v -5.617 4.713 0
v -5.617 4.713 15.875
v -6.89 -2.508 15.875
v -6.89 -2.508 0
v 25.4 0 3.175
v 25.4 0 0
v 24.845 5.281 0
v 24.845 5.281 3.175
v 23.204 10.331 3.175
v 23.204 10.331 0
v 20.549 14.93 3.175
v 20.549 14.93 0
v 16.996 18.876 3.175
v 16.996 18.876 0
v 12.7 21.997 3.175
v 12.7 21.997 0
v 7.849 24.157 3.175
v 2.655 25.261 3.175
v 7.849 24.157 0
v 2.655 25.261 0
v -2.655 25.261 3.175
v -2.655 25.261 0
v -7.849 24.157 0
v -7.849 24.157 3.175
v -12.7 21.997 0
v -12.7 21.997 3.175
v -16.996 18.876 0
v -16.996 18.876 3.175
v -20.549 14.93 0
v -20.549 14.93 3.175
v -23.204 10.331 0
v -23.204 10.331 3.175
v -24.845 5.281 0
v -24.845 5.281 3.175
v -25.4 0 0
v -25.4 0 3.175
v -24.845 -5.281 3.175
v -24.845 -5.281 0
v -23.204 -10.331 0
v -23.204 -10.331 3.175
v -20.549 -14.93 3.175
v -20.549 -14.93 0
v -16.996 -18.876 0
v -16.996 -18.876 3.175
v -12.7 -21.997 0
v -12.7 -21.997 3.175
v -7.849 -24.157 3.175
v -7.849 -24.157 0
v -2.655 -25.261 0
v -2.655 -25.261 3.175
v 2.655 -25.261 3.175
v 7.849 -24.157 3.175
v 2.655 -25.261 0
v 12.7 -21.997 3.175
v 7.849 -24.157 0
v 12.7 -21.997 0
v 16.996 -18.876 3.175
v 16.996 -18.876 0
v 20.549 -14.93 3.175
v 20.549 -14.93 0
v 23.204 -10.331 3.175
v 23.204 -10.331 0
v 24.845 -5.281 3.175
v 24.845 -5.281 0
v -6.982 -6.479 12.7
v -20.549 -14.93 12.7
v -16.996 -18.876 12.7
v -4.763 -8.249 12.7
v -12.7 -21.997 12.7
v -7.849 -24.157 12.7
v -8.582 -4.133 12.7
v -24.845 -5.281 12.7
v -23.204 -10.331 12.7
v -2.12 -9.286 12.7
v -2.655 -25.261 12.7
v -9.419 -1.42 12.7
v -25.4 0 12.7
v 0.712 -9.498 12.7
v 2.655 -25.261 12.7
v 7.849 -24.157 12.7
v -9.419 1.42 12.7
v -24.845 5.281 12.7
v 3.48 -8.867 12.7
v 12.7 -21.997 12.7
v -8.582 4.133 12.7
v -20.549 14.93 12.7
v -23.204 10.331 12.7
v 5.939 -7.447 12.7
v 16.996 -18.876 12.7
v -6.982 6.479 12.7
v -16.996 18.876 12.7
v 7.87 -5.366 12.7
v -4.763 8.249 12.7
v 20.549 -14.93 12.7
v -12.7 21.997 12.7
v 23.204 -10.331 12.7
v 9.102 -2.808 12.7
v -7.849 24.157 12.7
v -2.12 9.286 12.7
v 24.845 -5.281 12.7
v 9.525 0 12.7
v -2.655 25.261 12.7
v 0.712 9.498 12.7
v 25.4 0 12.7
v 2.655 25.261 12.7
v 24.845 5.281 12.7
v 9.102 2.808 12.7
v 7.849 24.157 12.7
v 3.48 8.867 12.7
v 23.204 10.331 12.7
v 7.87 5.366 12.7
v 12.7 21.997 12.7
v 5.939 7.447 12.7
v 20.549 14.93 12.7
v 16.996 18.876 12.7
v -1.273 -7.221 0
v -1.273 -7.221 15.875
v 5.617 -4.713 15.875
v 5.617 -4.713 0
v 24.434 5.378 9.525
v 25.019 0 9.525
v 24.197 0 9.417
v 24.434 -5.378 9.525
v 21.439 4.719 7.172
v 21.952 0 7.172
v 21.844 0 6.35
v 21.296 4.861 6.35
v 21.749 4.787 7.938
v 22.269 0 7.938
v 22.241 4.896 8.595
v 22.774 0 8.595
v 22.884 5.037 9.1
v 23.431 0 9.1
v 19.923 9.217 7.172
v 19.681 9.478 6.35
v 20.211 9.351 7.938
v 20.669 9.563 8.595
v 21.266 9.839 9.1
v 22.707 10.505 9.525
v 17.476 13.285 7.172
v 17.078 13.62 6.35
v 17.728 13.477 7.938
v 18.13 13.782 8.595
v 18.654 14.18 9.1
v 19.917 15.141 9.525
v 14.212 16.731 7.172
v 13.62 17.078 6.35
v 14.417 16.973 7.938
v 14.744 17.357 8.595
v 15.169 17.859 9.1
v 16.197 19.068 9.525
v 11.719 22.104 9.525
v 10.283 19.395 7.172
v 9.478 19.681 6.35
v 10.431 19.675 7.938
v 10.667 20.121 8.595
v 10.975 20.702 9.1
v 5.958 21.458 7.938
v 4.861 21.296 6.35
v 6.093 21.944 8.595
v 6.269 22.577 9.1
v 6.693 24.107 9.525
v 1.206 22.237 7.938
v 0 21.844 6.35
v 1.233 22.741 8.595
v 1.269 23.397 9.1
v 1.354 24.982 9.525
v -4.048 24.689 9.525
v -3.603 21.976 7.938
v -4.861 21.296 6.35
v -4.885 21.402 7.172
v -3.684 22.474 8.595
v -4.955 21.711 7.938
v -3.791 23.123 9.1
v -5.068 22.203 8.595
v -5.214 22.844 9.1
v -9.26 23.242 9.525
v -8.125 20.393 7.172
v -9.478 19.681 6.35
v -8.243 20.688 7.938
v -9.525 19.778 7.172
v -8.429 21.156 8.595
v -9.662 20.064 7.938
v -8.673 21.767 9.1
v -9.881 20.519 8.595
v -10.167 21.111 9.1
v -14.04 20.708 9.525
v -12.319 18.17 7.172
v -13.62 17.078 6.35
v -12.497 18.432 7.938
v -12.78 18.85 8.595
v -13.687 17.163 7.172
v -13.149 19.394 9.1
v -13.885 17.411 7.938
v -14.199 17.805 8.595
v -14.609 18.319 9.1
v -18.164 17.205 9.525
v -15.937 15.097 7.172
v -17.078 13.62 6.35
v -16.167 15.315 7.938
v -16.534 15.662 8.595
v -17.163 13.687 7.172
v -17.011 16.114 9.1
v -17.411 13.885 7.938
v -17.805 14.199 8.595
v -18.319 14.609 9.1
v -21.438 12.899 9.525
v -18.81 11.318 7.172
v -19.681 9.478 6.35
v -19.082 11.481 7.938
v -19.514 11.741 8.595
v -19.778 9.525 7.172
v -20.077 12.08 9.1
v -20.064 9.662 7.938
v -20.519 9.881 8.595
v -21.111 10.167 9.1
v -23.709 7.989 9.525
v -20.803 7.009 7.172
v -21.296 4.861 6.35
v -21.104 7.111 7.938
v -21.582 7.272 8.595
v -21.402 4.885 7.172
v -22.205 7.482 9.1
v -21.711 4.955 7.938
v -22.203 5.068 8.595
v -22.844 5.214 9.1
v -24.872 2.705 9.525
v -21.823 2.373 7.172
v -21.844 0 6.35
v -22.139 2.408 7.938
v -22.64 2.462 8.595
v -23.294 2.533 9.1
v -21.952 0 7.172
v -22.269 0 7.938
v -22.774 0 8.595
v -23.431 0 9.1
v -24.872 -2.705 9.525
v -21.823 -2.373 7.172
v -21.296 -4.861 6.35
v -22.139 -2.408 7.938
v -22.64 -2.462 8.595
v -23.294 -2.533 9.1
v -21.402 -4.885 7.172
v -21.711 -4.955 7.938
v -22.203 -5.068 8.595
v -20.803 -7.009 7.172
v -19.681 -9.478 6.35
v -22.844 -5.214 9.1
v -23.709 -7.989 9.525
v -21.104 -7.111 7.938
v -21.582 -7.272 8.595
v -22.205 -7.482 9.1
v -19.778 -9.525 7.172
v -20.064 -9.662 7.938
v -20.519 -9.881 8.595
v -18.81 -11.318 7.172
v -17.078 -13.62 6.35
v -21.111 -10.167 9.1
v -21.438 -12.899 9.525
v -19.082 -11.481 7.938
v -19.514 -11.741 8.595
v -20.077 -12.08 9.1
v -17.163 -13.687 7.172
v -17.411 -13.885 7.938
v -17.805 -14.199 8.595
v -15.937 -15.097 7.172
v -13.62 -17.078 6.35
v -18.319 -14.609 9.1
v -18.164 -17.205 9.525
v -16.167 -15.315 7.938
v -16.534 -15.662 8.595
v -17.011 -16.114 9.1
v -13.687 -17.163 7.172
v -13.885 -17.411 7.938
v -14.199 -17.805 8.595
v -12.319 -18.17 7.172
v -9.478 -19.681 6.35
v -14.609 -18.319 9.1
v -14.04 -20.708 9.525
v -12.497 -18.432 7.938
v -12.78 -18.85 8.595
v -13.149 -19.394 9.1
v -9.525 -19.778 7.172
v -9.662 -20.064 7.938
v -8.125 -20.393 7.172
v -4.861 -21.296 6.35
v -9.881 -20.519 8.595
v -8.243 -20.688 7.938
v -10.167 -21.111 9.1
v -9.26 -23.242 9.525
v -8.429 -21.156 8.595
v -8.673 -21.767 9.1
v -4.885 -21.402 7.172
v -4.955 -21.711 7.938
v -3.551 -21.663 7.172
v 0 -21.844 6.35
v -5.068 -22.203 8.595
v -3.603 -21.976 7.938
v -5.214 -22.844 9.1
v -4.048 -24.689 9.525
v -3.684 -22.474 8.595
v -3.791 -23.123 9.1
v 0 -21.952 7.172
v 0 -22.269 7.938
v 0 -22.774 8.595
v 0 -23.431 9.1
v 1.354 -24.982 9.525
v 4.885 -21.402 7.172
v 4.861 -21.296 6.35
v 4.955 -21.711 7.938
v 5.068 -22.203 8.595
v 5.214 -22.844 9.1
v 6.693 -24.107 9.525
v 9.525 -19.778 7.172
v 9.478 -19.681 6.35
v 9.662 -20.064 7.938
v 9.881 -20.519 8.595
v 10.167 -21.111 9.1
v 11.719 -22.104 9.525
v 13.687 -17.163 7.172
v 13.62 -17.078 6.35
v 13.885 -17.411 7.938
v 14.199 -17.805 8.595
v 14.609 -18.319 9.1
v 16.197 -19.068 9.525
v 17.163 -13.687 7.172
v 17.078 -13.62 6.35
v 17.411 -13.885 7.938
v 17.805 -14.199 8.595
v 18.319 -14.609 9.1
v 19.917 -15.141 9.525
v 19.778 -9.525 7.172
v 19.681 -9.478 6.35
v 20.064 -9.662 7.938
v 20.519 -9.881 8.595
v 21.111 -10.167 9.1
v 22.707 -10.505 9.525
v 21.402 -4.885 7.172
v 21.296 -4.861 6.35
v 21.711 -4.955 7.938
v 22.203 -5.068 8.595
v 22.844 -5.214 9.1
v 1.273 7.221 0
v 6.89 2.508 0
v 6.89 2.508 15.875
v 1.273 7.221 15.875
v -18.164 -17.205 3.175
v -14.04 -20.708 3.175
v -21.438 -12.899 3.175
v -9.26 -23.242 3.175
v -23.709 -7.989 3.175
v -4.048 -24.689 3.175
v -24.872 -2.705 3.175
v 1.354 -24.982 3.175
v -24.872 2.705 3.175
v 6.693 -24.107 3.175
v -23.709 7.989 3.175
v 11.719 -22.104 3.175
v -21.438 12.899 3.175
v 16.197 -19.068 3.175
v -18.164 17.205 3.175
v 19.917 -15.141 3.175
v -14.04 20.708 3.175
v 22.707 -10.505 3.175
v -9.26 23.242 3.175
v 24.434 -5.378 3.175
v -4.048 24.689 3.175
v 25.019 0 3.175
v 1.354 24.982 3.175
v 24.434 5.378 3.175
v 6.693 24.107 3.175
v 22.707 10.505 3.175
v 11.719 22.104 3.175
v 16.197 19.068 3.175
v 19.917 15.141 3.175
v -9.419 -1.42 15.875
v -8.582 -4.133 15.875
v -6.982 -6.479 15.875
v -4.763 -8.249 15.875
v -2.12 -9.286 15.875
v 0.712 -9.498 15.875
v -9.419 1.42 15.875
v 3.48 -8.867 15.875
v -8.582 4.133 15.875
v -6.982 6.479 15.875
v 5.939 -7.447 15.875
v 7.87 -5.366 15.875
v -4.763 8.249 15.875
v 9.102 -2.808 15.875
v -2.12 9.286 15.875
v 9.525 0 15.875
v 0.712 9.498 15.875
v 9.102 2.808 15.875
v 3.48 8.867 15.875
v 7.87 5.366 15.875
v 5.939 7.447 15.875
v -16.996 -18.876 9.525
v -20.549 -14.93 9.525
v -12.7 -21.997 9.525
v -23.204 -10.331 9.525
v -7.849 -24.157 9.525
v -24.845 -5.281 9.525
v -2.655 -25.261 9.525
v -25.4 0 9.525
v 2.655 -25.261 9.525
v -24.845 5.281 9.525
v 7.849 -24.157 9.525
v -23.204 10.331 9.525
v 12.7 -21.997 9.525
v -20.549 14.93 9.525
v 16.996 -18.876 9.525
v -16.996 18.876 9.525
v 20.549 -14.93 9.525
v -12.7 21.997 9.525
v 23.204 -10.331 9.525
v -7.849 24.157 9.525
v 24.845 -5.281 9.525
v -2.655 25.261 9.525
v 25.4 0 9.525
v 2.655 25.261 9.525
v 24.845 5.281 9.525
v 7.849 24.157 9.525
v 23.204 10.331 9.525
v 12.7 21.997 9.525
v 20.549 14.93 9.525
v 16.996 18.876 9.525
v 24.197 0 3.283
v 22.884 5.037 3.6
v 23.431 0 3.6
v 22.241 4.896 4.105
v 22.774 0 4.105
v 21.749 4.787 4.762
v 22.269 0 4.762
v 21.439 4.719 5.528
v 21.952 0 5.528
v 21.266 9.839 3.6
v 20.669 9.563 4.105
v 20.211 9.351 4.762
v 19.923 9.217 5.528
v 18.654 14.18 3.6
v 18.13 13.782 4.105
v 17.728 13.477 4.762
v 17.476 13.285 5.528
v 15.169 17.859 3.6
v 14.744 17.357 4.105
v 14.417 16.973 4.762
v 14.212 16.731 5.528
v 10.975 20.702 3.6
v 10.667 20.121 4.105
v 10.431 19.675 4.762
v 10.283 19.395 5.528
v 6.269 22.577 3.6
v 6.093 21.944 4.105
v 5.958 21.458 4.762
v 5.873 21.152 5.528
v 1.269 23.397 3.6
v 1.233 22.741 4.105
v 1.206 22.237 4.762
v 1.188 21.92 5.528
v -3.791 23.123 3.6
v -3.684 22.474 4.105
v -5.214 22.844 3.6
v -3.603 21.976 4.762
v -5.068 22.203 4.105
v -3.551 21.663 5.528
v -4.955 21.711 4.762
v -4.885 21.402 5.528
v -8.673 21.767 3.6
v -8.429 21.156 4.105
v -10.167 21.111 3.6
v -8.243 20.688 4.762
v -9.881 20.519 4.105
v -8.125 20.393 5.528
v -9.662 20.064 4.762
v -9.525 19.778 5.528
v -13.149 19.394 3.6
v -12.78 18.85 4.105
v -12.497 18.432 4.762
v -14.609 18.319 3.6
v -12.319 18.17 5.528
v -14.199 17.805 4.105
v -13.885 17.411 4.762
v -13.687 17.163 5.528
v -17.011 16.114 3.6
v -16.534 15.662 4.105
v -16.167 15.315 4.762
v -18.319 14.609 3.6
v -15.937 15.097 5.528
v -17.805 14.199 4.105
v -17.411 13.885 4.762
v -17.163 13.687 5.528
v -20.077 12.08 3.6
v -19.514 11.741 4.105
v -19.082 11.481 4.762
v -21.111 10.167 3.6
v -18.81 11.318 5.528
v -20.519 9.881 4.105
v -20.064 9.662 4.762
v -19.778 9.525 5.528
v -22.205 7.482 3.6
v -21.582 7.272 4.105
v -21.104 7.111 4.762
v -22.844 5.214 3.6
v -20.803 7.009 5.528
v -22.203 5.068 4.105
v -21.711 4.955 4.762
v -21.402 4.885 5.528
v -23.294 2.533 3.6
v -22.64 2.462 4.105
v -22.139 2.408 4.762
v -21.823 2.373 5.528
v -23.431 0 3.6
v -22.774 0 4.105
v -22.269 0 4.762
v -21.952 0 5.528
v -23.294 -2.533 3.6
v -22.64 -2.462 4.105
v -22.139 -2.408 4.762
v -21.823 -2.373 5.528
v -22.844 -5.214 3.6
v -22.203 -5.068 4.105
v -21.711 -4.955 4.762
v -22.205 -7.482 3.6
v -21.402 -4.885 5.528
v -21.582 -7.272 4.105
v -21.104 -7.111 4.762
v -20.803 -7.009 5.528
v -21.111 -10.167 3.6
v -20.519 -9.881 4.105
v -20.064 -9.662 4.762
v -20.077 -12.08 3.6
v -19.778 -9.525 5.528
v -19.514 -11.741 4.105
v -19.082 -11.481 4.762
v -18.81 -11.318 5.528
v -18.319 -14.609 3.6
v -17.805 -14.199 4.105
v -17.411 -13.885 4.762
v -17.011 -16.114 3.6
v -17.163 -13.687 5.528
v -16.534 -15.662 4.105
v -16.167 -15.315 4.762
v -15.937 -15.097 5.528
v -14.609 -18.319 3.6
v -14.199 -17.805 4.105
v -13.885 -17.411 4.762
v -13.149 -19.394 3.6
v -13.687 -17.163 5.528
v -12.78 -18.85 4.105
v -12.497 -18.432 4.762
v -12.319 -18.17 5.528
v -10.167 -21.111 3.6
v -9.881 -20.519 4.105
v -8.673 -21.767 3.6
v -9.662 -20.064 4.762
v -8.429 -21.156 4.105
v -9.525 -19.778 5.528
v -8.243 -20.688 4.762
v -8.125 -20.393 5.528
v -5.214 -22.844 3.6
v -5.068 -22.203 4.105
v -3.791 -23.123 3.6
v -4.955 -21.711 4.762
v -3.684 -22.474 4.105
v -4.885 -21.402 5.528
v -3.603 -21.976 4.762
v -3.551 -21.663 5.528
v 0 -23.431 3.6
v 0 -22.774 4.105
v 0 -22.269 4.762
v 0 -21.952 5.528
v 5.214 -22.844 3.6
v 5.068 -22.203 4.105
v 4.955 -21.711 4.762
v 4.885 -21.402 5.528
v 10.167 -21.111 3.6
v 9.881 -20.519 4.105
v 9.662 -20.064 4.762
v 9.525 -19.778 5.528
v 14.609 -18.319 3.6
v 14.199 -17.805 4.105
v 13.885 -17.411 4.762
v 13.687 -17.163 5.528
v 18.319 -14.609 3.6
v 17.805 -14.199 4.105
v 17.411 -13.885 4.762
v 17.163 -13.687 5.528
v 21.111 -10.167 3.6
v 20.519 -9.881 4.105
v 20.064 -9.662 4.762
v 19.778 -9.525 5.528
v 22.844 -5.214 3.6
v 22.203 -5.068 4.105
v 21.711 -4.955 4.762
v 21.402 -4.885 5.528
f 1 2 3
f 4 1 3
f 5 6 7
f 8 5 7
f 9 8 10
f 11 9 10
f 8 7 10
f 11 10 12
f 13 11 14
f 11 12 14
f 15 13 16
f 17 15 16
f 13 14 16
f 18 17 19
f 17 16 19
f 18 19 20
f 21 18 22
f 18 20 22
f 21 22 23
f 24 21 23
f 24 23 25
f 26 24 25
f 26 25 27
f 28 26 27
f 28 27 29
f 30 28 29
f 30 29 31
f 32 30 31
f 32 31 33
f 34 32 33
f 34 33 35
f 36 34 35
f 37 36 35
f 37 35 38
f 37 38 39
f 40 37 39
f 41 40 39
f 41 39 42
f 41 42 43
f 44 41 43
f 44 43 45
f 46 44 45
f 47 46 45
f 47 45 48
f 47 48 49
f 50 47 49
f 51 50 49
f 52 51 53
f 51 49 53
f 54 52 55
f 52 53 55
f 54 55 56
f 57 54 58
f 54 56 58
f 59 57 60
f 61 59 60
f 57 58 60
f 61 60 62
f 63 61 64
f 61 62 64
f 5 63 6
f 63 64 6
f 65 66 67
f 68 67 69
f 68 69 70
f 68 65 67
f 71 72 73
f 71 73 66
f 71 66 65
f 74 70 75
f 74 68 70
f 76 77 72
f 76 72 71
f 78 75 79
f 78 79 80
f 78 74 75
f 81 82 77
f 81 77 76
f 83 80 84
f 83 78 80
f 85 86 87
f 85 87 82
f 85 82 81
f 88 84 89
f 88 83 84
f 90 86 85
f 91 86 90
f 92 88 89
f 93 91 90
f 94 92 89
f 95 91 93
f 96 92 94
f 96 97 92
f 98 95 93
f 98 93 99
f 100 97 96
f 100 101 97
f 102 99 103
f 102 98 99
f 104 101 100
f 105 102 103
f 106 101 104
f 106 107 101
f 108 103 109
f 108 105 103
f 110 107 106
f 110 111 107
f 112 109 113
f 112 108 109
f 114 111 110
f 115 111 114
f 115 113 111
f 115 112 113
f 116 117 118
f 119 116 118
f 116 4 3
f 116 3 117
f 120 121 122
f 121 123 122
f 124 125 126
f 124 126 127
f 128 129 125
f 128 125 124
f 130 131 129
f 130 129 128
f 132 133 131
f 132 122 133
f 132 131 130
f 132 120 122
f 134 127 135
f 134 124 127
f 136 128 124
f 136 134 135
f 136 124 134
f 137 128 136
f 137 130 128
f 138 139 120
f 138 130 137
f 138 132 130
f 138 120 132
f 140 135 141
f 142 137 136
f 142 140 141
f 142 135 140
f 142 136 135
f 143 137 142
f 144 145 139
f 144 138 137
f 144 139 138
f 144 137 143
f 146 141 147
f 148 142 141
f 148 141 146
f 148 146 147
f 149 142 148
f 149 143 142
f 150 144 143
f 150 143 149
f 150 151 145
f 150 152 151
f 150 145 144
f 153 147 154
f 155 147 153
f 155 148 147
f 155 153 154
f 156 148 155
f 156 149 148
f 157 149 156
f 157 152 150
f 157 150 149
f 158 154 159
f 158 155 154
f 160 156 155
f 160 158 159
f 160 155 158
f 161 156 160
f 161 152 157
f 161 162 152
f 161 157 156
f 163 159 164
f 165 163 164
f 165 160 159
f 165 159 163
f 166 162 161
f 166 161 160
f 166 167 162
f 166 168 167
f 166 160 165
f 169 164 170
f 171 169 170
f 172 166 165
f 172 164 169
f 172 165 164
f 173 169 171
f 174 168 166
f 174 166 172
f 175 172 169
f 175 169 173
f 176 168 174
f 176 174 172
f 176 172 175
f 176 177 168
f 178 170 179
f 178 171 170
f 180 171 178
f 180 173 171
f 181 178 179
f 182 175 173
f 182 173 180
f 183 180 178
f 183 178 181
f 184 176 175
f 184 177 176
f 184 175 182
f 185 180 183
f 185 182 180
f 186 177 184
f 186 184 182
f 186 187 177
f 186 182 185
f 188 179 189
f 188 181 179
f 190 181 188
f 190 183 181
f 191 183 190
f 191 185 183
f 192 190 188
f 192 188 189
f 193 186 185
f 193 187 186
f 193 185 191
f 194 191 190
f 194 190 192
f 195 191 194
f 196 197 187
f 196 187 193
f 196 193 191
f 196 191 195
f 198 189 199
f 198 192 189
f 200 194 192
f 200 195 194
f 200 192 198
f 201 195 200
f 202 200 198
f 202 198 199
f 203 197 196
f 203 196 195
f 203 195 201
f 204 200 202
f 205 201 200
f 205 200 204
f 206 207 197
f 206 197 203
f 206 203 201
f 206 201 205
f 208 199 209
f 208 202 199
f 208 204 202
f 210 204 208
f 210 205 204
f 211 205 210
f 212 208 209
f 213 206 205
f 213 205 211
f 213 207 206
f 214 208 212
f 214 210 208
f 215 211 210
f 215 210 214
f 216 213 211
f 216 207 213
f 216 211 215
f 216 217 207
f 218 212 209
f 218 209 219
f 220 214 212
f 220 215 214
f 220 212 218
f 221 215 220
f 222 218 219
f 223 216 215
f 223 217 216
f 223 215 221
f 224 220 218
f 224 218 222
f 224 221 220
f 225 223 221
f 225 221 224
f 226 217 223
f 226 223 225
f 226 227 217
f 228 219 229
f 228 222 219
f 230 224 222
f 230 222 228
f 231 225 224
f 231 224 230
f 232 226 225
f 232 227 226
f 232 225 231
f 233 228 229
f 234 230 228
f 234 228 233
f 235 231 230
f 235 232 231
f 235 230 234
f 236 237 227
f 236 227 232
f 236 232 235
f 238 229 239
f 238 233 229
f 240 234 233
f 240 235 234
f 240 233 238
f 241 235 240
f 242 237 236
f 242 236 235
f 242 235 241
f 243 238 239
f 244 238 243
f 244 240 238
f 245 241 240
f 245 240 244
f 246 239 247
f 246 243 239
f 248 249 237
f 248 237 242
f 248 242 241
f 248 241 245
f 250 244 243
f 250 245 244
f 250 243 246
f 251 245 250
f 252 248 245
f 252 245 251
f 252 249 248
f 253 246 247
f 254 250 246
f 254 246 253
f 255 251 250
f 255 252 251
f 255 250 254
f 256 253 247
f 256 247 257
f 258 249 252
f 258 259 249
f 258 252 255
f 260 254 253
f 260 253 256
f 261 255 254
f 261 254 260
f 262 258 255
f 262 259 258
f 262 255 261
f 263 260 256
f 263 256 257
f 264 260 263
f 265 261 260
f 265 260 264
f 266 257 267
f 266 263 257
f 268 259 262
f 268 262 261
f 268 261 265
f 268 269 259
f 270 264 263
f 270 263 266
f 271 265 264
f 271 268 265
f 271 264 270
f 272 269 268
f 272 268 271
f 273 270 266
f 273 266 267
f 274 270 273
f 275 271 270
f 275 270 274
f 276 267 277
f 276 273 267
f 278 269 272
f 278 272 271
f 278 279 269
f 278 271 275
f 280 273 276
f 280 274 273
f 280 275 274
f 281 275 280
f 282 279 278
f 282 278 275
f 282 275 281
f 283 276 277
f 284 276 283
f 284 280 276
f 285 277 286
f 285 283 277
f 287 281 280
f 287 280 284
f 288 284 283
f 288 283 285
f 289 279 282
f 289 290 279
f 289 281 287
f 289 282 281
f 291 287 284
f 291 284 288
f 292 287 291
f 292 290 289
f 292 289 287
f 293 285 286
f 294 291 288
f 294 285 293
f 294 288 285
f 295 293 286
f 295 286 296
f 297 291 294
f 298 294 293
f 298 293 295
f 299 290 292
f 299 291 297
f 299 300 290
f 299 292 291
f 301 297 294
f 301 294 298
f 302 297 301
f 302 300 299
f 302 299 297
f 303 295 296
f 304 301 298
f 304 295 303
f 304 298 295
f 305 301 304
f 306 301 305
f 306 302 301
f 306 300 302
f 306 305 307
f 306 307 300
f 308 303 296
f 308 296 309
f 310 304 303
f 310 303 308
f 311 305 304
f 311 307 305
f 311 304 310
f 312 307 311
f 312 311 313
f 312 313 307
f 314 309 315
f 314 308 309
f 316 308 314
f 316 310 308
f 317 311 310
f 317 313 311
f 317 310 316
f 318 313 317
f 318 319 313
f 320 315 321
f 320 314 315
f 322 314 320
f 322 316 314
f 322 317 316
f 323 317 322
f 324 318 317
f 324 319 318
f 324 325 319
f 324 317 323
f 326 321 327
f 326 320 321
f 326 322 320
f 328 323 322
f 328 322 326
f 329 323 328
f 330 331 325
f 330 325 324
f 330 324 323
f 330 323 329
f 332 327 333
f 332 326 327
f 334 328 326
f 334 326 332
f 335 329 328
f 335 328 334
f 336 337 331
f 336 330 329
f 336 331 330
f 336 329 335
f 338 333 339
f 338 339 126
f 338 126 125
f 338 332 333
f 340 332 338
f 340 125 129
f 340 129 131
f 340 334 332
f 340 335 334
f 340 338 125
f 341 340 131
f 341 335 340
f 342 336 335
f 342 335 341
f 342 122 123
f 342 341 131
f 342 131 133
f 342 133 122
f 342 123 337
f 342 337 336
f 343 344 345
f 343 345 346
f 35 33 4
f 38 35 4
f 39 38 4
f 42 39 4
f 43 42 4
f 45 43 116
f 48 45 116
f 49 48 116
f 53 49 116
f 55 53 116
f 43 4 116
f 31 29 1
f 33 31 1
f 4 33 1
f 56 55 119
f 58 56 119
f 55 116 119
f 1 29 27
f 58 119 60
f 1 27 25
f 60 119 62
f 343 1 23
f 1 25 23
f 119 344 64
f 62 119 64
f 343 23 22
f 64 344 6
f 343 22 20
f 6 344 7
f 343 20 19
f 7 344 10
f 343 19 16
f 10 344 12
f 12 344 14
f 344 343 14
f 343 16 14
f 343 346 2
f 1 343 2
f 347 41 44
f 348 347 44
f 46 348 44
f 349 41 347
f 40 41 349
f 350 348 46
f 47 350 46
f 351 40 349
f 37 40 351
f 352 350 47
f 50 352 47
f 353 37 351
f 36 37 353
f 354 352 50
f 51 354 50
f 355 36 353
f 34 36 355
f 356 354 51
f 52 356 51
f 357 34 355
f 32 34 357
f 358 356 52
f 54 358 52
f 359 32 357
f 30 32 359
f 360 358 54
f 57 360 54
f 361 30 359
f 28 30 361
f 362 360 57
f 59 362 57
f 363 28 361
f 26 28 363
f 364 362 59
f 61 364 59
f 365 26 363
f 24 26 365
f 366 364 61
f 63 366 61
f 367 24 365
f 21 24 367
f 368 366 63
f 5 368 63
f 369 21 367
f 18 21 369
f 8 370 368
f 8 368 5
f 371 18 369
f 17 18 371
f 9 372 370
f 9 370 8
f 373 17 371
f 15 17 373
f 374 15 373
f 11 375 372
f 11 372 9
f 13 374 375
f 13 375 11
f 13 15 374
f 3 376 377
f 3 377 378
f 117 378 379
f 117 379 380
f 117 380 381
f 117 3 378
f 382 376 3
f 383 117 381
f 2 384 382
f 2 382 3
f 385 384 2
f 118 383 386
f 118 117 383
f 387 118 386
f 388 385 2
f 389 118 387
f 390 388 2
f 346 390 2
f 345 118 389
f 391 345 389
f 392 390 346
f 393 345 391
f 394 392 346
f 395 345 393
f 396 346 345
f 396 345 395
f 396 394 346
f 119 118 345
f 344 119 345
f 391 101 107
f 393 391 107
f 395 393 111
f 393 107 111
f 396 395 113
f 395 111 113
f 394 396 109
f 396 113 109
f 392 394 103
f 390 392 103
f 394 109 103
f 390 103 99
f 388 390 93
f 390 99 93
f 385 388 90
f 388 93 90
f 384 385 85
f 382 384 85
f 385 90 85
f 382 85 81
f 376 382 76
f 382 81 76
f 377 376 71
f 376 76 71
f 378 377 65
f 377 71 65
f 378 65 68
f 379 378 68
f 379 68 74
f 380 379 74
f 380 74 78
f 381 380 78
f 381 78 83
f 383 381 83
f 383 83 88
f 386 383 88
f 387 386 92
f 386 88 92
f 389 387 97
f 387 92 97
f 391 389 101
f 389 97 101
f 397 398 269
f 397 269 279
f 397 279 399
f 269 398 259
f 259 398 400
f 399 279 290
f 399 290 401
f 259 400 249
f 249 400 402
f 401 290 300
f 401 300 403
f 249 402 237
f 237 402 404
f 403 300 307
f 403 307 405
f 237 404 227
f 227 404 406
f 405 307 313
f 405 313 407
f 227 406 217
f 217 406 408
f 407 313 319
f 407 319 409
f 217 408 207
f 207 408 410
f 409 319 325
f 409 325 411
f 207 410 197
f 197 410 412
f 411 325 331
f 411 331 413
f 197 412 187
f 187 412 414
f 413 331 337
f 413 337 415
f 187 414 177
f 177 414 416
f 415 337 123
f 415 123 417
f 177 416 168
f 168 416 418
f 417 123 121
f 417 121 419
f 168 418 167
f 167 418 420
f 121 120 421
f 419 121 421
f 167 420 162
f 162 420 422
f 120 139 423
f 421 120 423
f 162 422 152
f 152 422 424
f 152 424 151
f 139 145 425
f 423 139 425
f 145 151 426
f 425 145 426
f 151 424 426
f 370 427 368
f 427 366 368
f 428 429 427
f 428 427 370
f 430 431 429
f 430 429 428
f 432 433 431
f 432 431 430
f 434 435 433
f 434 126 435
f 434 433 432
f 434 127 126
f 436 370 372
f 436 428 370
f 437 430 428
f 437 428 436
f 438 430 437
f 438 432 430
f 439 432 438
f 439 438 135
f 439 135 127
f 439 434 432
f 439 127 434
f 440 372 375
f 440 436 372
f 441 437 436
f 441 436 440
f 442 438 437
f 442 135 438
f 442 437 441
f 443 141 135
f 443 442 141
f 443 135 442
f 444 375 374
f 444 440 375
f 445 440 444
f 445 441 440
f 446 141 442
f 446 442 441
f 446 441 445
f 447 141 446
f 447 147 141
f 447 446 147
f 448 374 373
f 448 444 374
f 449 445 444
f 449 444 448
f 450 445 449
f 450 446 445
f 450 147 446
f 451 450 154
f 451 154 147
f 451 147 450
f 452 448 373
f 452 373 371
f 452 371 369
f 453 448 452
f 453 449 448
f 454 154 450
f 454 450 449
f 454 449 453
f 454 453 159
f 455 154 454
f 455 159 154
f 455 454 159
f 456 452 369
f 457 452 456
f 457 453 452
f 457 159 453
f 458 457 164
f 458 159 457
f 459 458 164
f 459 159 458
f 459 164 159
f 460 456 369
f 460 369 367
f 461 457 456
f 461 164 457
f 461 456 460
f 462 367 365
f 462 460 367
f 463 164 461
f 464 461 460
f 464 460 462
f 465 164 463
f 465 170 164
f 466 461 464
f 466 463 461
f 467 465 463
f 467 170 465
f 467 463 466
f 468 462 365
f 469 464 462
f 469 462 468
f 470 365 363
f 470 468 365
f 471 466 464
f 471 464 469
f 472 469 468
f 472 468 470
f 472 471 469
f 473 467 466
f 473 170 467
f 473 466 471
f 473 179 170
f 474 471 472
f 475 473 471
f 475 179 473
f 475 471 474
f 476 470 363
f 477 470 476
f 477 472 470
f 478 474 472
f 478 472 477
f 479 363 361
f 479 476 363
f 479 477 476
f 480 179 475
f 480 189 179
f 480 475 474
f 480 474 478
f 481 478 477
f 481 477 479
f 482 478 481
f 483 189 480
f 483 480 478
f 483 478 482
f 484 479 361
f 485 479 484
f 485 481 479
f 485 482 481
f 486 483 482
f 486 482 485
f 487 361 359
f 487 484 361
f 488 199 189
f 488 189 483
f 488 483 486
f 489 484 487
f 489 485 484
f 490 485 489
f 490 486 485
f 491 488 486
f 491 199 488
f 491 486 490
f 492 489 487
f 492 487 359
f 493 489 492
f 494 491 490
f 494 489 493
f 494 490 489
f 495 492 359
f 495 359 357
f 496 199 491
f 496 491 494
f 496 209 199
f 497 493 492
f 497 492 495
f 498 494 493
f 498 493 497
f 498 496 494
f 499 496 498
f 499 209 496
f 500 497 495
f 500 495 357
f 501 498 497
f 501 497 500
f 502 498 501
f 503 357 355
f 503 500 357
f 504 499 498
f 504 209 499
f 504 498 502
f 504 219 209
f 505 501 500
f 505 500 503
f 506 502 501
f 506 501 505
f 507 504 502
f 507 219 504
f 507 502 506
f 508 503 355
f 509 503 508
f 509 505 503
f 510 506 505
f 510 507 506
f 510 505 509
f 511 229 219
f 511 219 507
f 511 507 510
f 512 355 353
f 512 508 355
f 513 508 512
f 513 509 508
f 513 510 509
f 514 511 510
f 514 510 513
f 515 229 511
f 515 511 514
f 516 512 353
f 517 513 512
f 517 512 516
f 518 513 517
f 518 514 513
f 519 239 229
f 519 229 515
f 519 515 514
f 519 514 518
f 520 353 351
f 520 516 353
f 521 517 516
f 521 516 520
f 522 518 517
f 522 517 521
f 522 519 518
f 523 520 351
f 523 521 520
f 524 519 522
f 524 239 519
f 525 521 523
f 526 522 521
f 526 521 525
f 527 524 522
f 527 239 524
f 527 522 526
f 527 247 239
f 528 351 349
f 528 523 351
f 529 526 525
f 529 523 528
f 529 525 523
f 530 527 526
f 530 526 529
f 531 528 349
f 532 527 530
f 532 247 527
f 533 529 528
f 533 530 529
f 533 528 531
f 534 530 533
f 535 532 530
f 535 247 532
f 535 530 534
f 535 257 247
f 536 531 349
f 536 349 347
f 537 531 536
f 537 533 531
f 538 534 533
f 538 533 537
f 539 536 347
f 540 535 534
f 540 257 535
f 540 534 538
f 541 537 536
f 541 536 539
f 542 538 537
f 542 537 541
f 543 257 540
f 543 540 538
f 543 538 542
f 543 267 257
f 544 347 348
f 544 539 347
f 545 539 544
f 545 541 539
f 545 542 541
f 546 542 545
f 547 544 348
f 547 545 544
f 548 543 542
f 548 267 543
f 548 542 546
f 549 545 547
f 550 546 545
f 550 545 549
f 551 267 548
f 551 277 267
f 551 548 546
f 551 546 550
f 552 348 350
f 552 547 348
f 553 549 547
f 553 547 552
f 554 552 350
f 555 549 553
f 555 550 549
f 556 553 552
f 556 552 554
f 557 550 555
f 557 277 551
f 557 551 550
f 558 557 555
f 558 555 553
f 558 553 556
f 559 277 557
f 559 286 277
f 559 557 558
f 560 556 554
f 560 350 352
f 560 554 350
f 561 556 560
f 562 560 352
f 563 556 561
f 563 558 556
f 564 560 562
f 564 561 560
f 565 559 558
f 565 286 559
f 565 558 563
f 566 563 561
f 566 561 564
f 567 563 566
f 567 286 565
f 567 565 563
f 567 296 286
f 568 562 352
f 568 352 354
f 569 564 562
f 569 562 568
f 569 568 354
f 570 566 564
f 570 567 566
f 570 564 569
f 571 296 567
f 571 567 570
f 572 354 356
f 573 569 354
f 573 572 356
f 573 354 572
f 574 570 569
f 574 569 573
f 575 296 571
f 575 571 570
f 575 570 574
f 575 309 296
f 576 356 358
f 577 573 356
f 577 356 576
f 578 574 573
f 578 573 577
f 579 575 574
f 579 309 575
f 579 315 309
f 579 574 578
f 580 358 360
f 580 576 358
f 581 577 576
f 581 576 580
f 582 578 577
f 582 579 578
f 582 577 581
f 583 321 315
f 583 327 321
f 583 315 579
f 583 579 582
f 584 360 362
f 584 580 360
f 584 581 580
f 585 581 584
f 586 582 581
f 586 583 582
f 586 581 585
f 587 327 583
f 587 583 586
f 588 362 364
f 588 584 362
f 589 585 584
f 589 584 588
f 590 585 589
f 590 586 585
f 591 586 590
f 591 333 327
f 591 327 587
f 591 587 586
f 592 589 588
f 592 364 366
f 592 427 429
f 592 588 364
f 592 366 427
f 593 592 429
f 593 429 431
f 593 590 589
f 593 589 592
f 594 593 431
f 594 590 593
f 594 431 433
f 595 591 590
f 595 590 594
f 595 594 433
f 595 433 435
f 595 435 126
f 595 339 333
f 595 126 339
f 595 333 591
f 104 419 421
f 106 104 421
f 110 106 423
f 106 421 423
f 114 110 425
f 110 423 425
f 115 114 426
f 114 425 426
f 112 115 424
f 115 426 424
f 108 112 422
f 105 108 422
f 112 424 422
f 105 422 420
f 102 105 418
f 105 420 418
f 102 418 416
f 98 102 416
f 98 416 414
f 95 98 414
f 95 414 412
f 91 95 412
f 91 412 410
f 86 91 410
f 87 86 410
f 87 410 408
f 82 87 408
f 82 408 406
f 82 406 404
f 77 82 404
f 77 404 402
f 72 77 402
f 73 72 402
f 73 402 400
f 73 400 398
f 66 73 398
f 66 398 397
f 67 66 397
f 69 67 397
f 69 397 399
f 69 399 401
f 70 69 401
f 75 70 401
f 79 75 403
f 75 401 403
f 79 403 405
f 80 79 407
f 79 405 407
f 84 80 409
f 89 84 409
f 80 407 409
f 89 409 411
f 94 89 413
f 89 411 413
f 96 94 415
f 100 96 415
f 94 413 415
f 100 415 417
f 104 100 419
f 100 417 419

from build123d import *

# Parameters (mm, degrees)
SKETCH1_R           = 25.4
BOSS_EXTRUDE1_DEPTH = 12.7
CUT_EXTRUDE1_START  = -6.35
SKETCH2_R           = 25.4
SKETCH2_R_2         = 21.844
CUT_EXTRUDE1_DEPTH  = 6.35
FILLET1_R           = 3.175
CUT_EXTRUDE4_DEPTH  = 12.7
SKETCH6_R           = 9.525
BOSS_EXTRUDE4_DEPTH = 3.175


with BuildPart() as part:
    # Sketch1 → Boss-Extrude1 (new body)
    with BuildSketch(Plane.XY):
        Circle(SKETCH1_R)
    extrude(amount=BOSS_EXTRUDE1_DEPTH)

    # Sketch2 → Cut-Extrude1 (cut)
    with BuildSketch(Plane.XY.offset(9.525).offset(CUT_EXTRUDE1_START)):
        Circle(SKETCH2_R)
        Circle(SKETCH2_R_2, mode=Mode.SUBTRACT)
    extrude(amount=CUT_EXTRUDE1_DEPTH, mode=Mode.SUBTRACT)

    # Fillet1
    fillet1_edges = [part.edges().sort_by_distance(p)[0] for p in [
        (-21.844, 0, 3.175),
        (-21.844, 0, 9.525),
    ]]
    fillet(fillet1_edges, radius=FILLET1_R - 0.0001)  # a hair under: the kernel refuses the full size

    # Sketch3 → Cut-Extrude4 (cut)
    with BuildSketch(Plane.XY.offset(12.7)):
        Polygon((-1.272676276, -7.221054523), (5.617278521, -4.712697248), (6.889954797, 2.508357276), (1.272676276, 7.221054523), (-5.617278521, 4.712697248), (-6.889954797, -2.508357276), align=None)
    extrude(amount=-CUT_EXTRUDE4_DEPTH, mode=Mode.SUBTRACT)

    # Sketch6 → Boss-Extrude4 (add)
    with BuildSketch(Plane.XY.offset(12.7)):
        Circle(SKETCH6_R)
        Polygon((-1.272676276, -7.221054523), (5.617278521, -4.712697248), (6.889954797, 2.508357276), (1.272676276, 7.221054523), (-5.617278521, 4.712697248), (-6.889954797, -2.508357276), align=None, mode=Mode.SUBTRACT)
    extrude(amount=BOSS_EXTRUDE4_DEPTH)


solid = part.part
